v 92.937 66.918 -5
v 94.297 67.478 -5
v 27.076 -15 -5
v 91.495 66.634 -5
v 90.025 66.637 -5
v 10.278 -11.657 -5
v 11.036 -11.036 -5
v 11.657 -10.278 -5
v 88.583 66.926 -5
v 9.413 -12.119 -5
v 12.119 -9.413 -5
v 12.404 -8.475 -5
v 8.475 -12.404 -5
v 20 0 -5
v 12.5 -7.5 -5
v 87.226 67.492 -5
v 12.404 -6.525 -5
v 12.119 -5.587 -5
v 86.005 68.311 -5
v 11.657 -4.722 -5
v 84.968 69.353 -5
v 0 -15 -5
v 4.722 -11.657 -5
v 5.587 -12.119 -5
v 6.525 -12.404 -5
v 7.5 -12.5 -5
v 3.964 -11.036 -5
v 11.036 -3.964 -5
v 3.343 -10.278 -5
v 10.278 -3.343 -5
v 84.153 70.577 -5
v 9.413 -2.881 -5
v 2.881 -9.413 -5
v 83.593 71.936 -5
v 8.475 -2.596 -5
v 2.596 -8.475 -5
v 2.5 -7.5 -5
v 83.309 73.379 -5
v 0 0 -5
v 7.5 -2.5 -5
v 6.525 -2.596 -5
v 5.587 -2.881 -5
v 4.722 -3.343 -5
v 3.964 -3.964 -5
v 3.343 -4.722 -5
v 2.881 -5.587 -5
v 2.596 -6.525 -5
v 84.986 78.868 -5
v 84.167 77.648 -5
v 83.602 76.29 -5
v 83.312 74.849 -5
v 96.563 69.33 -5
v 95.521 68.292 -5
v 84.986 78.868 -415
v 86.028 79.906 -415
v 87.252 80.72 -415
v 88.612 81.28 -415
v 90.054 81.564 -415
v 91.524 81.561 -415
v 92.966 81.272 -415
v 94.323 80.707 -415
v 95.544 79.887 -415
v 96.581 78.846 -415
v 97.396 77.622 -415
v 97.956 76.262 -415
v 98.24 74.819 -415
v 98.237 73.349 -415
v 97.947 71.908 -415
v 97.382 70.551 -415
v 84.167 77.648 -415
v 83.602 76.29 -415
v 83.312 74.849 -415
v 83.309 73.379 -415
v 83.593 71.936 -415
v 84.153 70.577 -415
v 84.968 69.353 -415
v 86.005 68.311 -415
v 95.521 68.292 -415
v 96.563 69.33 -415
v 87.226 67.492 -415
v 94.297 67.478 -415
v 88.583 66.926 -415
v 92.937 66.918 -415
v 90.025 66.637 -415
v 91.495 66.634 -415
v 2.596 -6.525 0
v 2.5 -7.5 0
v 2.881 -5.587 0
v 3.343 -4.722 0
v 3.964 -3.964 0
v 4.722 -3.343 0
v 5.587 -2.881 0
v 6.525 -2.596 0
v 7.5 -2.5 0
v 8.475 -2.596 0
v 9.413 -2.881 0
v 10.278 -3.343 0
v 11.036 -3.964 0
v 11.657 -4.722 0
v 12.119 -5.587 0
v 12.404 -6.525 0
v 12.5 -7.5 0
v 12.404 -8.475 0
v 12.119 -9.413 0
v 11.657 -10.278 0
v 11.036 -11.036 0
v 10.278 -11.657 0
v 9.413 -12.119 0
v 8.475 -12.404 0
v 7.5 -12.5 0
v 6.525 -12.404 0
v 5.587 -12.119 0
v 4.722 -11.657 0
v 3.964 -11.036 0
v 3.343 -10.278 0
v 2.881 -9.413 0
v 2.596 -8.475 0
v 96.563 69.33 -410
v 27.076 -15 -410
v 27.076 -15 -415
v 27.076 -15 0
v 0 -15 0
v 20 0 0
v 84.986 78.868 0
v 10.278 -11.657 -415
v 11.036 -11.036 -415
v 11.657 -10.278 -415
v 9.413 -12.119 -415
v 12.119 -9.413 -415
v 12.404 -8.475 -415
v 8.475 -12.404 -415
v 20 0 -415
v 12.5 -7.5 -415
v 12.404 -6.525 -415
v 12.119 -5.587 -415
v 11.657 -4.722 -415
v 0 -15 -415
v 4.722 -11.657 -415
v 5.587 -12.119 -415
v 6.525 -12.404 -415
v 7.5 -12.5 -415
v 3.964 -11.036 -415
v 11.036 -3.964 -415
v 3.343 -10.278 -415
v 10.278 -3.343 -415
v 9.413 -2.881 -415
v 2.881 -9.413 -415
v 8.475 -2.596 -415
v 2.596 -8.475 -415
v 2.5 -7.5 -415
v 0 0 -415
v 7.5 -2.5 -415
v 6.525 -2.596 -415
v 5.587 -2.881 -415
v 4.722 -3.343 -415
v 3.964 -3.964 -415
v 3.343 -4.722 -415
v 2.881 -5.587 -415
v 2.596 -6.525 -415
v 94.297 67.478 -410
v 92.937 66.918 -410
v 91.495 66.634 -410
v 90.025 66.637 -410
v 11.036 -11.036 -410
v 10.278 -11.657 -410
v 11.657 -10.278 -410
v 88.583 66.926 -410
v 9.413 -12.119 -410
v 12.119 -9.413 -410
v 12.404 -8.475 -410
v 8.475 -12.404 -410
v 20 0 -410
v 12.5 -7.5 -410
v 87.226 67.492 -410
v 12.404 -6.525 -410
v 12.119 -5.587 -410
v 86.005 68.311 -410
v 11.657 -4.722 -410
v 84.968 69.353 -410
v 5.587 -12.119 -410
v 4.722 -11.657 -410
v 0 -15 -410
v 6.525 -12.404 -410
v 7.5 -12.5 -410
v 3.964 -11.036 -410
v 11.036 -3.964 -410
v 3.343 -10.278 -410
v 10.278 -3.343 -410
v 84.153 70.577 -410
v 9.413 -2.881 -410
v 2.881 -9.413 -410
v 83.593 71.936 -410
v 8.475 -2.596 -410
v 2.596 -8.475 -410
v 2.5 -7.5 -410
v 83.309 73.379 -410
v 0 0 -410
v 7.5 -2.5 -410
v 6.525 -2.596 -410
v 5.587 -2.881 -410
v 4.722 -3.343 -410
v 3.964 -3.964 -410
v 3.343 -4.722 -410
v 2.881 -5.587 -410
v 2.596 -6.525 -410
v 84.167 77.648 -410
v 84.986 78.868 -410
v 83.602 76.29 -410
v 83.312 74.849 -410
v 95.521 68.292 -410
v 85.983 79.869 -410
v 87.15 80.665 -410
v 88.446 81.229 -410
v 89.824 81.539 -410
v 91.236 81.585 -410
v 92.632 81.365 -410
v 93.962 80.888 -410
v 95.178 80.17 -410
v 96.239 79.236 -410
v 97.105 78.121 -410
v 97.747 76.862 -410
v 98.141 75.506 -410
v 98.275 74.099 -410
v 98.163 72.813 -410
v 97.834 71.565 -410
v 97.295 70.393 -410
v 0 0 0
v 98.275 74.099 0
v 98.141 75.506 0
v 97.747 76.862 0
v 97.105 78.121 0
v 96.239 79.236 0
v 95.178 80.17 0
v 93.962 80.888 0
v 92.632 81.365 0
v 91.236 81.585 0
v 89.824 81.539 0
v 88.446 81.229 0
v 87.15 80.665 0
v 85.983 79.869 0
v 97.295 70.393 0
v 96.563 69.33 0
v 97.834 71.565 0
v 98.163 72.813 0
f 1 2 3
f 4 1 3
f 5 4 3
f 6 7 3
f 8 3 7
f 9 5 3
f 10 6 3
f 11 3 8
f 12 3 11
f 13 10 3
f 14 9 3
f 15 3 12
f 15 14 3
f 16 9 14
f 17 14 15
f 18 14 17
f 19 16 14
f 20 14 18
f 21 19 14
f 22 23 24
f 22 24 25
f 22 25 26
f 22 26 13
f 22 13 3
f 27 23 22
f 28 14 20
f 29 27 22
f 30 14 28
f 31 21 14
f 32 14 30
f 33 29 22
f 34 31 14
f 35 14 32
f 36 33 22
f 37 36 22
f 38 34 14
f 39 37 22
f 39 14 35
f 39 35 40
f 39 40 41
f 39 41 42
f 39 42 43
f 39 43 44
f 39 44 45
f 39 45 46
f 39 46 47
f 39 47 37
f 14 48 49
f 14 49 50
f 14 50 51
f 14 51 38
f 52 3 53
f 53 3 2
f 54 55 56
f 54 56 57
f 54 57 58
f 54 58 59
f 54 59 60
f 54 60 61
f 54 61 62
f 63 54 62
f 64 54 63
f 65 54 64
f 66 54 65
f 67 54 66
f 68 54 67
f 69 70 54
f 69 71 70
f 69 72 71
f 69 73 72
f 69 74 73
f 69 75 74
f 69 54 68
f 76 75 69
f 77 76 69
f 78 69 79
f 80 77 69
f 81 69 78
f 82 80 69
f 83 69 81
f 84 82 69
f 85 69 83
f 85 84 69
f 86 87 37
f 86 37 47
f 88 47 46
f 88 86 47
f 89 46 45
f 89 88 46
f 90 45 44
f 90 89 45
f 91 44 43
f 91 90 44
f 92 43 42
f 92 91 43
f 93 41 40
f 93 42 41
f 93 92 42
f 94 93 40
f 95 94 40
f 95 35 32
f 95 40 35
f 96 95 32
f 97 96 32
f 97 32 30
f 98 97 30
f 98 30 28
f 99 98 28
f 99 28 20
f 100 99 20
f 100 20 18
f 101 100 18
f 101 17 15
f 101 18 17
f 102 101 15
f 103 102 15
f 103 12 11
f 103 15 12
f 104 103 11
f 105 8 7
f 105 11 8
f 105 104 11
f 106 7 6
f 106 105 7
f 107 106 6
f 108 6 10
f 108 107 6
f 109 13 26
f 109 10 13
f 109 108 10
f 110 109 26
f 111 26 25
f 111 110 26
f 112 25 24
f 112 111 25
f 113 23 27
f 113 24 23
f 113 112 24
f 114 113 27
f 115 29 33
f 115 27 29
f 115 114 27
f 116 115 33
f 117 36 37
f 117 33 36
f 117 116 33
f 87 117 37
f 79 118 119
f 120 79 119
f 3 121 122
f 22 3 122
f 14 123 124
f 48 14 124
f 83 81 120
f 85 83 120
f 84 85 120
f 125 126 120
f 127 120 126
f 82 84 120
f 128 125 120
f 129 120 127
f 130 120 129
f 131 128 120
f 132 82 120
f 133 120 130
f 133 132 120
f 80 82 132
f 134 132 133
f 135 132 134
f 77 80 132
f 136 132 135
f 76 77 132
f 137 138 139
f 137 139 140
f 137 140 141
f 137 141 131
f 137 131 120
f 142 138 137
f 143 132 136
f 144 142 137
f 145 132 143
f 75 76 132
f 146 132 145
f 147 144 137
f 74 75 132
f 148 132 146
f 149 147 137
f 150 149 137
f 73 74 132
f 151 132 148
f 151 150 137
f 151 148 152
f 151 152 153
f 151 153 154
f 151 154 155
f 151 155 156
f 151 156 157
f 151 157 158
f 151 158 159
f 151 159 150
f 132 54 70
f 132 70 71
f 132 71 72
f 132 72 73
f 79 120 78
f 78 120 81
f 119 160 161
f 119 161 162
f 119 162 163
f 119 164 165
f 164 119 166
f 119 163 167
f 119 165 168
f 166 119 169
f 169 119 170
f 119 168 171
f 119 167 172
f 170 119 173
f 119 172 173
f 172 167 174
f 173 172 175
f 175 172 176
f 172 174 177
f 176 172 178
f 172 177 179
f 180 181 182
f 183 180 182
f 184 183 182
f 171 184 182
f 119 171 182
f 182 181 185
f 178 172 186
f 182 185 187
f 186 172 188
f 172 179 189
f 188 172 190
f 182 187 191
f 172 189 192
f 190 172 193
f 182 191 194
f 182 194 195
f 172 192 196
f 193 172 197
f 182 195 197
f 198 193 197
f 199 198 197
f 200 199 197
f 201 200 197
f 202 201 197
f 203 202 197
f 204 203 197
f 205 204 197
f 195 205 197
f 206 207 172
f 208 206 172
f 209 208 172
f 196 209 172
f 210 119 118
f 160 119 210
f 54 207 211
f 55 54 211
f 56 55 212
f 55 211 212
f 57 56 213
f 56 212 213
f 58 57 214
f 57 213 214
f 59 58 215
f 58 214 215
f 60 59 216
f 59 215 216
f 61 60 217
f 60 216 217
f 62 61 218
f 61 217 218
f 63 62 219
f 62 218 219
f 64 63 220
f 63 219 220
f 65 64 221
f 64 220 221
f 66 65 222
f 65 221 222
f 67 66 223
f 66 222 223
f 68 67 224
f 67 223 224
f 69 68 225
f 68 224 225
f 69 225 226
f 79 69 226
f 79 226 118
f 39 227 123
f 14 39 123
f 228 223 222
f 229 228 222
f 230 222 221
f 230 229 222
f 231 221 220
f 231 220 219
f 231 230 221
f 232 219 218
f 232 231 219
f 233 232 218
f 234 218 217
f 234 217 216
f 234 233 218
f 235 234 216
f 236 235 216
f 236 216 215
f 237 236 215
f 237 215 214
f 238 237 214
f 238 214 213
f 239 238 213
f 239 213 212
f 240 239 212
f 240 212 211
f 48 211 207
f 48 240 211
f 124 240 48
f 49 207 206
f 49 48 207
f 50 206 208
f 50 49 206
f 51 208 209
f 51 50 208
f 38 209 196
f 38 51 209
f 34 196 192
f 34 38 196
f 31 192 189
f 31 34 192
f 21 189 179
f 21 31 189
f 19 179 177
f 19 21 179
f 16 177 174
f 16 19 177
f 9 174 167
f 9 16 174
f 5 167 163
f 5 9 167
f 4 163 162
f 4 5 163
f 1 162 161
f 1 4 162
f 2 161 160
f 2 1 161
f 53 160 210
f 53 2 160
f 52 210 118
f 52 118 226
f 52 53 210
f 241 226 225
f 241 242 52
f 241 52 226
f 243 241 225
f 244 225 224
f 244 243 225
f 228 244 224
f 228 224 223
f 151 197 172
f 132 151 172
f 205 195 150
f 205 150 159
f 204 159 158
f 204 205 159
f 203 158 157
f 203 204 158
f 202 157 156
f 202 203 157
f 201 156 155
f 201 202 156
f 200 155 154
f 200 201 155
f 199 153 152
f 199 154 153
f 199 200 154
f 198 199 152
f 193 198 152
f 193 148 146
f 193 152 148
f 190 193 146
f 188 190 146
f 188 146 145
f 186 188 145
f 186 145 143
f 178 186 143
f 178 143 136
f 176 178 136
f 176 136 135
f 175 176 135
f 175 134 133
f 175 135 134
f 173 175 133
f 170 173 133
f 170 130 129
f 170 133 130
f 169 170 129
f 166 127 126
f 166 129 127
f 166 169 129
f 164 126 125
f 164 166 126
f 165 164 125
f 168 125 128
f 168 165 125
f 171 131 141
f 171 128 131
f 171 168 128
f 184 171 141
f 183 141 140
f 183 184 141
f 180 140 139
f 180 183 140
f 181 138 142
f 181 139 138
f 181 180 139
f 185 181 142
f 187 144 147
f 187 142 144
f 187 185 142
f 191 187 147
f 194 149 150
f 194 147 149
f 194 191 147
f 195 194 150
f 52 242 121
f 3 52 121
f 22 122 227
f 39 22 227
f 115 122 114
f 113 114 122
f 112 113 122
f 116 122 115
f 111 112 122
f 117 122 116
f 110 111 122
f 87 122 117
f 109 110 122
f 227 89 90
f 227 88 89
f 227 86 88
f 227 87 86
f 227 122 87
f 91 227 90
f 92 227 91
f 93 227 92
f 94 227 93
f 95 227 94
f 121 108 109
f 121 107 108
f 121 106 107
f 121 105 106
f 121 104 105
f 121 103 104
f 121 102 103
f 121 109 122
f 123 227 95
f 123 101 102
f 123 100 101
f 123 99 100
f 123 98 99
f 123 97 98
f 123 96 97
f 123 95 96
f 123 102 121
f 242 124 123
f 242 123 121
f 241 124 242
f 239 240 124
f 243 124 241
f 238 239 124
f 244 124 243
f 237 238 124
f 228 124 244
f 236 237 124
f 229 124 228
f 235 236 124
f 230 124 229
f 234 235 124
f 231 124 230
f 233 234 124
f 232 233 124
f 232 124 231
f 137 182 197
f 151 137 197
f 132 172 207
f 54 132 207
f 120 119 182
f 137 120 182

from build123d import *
from build123d.topology import SkipClean

# Parameters (mm, degrees)
BOSS_EXTRUDE1_DEPTH     = 5
SKETCH2_R               = 7.5
BOSS_EXTRUDE2_DEPTH     = 410
BOSS_EXTRUDE3_DEPTH     = 5
SKETCH4_R               = 7.5
BOSS_EXTRUDE4_DEPTH     = 5
CUT_EXTRUDE1_DEPTH      = 435.21341148
CUT_EXTRUDE1_DEPTH_BACK = 435.21341148
SKETCH5_R               = 5


with BuildPart() as part:
    # Sketch1 → Boss-Extrude1 (new body)
    with BuildSketch(Plane.XY):
        Polygon((0, 0), (20, 0), (84.986314287, 78.868447374), (96.562686745, 69.329705281), (27.076385016, -15), (0, -15), align=None)
    extrude(amount=-BOSS_EXTRUDE1_DEPTH)

    # Sketch2 → Boss-Extrude2 (add)
    with BuildSketch(Plane.XY):
        with Locations((90.774500516, 74.099076328)):
            Circle(SKETCH2_R)
    extrude(amount=-BOSS_EXTRUDE2_DEPTH)



with BuildPart() as body_2:
    # Sketch3 → Boss-Extrude3 (new body)
    with BuildSketch(Plane(origin=(0, 0, -410), x_dir=(-1, 0, 0), z_dir=(0, 0, -1))):
        with BuildLine():
            Line((-20, 0), (-84.986314287, 78.868447374))
            ThreePointArc((-84.986314287, 78.868447374), (-86.005129469, 68.310890099), (-96.562686745, 69.329705281))
            Line((-96.562686745, 69.329705281), (-27.076385016, -15))
            Line((-27.076385016, -15), (0, -15))
            Line((0, -15), (0, 0))
            Line((0, 0), (-20, 0))
        make_face()
    extrude(amount=BOSS_EXTRUDE3_DEPTH)


with BuildPart() as part_1:
    with SkipClean():  # the faces are left unmerged after this step: merging them gives an invalid solid
        add(part.part)

        add(body_2.part)  # Boss-Extrude4 merges body 2
        # Sketch4 → Boss-Extrude4 (add)
        with BuildSketch(Plane(origin=(0, 0, -410), x_dir=(-1, 0, 0), z_dir=(0, 0, -1))):
            with Locations(Location((-90.774500516, 74.099076328, 0), (0, 0, 219.487965992))):
                Circle(SKETCH4_R)
        extrude(amount=BOSS_EXTRUDE4_DEPTH)

    # Sketch5 → Cut-Extrude1 (cut, two sides: drawn at the far end of the back side and taken through both)
    with SkipClean():  # the faces are left unmerged after this step: merging them gives an invalid solid
        with BuildSketch(Plane(origin=(0, 0, -415), x_dir=(-1, 0, 0), z_dir=(0, 0, -1)).offset(-CUT_EXTRUDE1_DEPTH_BACK)):
            with Locations((-7.5, -7.5)):
                Circle(SKETCH5_R)
        extrude(amount=CUT_EXTRUDE1_DEPTH + CUT_EXTRUDE1_DEPTH_BACK, mode=Mode.SUBTRACT)


solid = part_1.part
